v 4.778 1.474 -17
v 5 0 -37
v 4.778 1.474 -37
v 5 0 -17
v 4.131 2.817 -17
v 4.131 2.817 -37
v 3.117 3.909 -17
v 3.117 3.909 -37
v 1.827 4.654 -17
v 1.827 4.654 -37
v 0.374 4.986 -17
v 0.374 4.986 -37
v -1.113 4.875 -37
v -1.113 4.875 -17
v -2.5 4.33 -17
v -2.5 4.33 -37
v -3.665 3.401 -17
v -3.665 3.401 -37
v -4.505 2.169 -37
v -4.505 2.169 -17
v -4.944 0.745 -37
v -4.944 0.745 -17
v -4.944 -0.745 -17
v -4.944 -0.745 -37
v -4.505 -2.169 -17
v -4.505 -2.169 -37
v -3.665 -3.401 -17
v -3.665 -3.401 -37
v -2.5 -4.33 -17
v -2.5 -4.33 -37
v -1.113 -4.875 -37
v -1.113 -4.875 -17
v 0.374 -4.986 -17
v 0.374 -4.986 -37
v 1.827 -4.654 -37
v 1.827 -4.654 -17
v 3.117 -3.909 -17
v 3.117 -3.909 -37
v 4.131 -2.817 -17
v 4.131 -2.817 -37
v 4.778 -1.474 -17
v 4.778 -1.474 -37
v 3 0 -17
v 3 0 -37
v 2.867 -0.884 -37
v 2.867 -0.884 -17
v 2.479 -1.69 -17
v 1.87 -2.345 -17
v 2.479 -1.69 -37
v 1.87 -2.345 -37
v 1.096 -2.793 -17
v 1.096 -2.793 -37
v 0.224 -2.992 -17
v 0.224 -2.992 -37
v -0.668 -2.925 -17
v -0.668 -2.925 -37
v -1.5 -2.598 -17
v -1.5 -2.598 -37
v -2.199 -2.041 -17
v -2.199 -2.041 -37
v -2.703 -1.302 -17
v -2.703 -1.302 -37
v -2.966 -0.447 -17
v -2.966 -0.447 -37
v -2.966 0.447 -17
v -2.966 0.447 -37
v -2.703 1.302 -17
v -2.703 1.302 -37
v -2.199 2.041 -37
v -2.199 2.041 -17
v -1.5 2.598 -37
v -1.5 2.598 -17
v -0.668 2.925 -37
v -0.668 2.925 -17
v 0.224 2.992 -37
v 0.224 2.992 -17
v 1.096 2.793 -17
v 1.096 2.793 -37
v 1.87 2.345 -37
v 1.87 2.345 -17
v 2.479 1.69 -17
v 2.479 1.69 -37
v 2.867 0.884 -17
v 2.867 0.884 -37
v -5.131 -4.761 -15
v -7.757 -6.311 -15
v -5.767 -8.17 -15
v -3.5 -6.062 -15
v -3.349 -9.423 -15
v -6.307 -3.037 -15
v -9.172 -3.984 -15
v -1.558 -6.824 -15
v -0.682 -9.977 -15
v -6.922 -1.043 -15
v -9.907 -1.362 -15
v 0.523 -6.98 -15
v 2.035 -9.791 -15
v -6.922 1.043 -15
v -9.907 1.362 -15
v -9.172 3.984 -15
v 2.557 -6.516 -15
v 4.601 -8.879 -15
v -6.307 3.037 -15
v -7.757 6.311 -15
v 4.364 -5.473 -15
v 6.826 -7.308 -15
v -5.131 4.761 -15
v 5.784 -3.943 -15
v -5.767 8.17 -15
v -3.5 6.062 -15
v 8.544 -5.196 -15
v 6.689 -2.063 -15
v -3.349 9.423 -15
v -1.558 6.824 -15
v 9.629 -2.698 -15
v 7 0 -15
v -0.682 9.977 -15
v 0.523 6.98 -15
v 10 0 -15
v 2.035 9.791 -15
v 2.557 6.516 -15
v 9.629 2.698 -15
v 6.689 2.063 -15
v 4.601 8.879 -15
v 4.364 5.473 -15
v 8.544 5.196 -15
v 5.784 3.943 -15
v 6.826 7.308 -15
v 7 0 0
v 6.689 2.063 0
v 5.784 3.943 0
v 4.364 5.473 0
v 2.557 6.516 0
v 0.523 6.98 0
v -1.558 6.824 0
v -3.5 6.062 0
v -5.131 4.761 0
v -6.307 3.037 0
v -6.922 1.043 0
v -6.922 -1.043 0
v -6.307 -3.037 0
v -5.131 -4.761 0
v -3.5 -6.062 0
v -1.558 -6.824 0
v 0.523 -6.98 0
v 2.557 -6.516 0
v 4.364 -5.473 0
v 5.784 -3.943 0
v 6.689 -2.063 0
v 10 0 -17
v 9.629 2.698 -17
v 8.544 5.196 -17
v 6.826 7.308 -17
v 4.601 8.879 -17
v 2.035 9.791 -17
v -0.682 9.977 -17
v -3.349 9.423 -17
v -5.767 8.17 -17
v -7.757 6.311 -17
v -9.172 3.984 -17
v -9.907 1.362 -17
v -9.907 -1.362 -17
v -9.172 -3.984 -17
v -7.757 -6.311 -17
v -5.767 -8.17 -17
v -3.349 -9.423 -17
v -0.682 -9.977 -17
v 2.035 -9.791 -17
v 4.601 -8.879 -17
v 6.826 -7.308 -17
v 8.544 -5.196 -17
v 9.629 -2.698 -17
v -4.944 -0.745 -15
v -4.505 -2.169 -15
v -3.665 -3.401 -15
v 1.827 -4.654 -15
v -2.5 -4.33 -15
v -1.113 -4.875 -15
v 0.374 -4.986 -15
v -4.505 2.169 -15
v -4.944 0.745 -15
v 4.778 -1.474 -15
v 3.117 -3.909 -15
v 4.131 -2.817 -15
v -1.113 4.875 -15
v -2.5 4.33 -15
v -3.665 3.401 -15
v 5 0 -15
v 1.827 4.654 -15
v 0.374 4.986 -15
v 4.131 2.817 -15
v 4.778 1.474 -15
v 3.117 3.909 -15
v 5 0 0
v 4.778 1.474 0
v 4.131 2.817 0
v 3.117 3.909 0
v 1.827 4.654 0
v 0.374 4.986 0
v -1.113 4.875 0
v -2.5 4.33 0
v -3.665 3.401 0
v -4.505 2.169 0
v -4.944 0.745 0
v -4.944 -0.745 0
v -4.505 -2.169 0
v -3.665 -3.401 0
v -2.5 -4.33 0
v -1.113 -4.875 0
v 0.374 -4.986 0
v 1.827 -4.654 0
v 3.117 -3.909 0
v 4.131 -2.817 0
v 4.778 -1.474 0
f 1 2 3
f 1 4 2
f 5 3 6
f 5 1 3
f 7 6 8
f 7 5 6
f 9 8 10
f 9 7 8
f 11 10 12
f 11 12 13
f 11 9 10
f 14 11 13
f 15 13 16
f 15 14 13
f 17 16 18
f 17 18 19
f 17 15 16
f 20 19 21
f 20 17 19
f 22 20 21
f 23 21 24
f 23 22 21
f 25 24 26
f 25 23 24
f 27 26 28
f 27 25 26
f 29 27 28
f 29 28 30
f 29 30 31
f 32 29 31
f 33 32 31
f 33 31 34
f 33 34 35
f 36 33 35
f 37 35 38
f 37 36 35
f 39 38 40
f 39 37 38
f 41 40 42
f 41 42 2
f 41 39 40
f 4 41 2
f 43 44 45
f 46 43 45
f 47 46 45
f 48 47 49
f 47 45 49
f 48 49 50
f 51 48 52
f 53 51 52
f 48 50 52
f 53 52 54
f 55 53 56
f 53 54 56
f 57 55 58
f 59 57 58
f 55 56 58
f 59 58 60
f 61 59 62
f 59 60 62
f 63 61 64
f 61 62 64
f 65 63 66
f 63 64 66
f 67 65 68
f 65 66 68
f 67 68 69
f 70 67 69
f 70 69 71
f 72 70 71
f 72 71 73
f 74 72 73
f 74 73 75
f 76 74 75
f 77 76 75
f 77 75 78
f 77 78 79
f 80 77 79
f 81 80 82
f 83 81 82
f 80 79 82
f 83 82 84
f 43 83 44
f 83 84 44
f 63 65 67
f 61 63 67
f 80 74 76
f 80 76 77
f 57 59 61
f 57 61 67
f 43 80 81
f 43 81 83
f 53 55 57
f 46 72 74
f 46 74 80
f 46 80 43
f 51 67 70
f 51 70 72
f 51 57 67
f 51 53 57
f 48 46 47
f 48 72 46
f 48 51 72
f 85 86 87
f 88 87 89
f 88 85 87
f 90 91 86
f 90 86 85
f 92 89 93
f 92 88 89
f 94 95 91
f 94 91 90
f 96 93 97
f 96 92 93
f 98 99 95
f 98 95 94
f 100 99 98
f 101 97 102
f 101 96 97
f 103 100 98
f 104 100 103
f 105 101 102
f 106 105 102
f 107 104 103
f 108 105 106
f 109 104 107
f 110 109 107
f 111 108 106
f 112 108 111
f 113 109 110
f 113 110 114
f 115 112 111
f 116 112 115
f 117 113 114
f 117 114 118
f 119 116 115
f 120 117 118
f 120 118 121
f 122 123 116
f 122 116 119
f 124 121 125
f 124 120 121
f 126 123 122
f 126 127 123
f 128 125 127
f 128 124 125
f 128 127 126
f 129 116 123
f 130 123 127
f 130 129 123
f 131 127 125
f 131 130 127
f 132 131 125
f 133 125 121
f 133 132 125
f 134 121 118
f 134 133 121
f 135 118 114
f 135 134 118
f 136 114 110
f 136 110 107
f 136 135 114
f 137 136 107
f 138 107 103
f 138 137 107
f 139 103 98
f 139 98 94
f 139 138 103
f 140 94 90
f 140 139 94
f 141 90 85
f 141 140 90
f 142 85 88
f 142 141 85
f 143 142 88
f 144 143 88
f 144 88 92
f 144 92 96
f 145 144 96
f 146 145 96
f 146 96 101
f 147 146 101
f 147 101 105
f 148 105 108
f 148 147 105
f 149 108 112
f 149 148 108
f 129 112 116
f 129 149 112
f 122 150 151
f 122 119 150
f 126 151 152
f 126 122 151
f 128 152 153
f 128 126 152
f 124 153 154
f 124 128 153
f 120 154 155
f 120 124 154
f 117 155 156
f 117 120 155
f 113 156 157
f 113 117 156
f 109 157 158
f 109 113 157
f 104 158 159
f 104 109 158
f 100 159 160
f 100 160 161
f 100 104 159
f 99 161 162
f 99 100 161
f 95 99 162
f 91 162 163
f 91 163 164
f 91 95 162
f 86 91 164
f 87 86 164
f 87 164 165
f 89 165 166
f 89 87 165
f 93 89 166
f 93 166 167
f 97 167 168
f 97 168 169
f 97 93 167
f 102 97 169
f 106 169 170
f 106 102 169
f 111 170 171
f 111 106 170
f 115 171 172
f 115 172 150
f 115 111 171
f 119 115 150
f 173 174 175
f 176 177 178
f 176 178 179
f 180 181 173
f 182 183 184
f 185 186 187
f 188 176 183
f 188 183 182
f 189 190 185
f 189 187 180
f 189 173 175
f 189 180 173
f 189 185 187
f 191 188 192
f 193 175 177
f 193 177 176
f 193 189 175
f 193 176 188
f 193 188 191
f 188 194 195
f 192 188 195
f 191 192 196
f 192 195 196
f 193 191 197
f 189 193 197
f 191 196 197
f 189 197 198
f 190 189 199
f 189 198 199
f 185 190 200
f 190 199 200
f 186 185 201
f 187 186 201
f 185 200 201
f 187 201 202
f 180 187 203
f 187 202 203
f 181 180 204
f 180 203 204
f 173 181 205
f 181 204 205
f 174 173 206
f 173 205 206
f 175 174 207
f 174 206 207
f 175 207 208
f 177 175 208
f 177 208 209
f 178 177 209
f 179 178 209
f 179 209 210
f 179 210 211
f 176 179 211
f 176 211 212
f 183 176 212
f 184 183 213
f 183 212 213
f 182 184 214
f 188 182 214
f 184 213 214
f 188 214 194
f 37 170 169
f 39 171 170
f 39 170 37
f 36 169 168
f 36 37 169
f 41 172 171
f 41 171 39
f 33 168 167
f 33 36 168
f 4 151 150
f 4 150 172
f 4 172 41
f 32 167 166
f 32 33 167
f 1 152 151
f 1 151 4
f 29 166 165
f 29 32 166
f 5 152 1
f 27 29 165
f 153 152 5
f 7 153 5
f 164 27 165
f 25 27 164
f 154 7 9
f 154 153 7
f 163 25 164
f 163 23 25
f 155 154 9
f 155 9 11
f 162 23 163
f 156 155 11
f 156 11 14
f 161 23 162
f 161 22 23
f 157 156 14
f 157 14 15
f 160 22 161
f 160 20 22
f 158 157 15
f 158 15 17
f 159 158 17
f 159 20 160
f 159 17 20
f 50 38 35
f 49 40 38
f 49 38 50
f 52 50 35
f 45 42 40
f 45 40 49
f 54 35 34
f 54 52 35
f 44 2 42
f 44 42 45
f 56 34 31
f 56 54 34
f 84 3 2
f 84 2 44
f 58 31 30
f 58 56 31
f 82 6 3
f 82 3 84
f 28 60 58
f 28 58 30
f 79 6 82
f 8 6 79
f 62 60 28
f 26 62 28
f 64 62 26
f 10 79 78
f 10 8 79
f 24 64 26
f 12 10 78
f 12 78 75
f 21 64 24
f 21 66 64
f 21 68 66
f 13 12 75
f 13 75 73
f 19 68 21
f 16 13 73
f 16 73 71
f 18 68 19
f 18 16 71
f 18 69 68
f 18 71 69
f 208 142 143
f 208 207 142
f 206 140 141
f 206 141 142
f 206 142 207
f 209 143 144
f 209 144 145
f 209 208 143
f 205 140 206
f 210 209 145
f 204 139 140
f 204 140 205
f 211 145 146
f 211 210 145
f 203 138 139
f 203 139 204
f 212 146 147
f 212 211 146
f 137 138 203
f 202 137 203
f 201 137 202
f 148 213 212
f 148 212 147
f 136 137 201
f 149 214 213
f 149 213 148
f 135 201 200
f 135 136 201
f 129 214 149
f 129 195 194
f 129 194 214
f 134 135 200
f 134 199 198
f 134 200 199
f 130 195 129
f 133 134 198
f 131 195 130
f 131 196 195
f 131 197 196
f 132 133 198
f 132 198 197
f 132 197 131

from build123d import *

# Parameters (mm, degrees)
F2_R     = 5
F3_DEPTH = 15
F4_R     = 3
F5_DEPTH = 20
F6_R     = 2.9
F7_DEPTH = 20


with BuildPart() as f1:
    # F0 (on Front) → F1 (revolve)
    with BuildSketch(Plane.XZ):
        Polygon((7, 0), (0, 0), (0, -37), (5, -37), (5, -17), (7, -17), (10, -17), (10, -15), (7, -15), align=None)
    revolve(axis=Axis((0, 0, -18.5), (0, 0, 1)))

    # F2 (on face) → F3 (cut, through all)
    with BuildSketch(Plane.XY):
        Circle(F2_R)
    extrude(amount=-F3_DEPTH, mode=Mode.SUBTRACT)

    # F4 (on face) → F5 (cut, through all)
    with BuildSketch(Plane(origin=(0, 0, -37), x_dir=(1, 0, 0), z_dir=(0, 0, -1))):
        Circle(F4_R)
    extrude(amount=-F5_DEPTH, mode=Mode.SUBTRACT)


with BuildPart() as f7:
    # F6 (on face) → F7 (new body)
    with BuildSketch(Plane(origin=(0, 0, -37), x_dir=(1, 0, 0), z_dir=(0, 0, -1))):
        Circle(F6_R)
    extrude(amount=-F7_DEPTH)


solid = f1.part
